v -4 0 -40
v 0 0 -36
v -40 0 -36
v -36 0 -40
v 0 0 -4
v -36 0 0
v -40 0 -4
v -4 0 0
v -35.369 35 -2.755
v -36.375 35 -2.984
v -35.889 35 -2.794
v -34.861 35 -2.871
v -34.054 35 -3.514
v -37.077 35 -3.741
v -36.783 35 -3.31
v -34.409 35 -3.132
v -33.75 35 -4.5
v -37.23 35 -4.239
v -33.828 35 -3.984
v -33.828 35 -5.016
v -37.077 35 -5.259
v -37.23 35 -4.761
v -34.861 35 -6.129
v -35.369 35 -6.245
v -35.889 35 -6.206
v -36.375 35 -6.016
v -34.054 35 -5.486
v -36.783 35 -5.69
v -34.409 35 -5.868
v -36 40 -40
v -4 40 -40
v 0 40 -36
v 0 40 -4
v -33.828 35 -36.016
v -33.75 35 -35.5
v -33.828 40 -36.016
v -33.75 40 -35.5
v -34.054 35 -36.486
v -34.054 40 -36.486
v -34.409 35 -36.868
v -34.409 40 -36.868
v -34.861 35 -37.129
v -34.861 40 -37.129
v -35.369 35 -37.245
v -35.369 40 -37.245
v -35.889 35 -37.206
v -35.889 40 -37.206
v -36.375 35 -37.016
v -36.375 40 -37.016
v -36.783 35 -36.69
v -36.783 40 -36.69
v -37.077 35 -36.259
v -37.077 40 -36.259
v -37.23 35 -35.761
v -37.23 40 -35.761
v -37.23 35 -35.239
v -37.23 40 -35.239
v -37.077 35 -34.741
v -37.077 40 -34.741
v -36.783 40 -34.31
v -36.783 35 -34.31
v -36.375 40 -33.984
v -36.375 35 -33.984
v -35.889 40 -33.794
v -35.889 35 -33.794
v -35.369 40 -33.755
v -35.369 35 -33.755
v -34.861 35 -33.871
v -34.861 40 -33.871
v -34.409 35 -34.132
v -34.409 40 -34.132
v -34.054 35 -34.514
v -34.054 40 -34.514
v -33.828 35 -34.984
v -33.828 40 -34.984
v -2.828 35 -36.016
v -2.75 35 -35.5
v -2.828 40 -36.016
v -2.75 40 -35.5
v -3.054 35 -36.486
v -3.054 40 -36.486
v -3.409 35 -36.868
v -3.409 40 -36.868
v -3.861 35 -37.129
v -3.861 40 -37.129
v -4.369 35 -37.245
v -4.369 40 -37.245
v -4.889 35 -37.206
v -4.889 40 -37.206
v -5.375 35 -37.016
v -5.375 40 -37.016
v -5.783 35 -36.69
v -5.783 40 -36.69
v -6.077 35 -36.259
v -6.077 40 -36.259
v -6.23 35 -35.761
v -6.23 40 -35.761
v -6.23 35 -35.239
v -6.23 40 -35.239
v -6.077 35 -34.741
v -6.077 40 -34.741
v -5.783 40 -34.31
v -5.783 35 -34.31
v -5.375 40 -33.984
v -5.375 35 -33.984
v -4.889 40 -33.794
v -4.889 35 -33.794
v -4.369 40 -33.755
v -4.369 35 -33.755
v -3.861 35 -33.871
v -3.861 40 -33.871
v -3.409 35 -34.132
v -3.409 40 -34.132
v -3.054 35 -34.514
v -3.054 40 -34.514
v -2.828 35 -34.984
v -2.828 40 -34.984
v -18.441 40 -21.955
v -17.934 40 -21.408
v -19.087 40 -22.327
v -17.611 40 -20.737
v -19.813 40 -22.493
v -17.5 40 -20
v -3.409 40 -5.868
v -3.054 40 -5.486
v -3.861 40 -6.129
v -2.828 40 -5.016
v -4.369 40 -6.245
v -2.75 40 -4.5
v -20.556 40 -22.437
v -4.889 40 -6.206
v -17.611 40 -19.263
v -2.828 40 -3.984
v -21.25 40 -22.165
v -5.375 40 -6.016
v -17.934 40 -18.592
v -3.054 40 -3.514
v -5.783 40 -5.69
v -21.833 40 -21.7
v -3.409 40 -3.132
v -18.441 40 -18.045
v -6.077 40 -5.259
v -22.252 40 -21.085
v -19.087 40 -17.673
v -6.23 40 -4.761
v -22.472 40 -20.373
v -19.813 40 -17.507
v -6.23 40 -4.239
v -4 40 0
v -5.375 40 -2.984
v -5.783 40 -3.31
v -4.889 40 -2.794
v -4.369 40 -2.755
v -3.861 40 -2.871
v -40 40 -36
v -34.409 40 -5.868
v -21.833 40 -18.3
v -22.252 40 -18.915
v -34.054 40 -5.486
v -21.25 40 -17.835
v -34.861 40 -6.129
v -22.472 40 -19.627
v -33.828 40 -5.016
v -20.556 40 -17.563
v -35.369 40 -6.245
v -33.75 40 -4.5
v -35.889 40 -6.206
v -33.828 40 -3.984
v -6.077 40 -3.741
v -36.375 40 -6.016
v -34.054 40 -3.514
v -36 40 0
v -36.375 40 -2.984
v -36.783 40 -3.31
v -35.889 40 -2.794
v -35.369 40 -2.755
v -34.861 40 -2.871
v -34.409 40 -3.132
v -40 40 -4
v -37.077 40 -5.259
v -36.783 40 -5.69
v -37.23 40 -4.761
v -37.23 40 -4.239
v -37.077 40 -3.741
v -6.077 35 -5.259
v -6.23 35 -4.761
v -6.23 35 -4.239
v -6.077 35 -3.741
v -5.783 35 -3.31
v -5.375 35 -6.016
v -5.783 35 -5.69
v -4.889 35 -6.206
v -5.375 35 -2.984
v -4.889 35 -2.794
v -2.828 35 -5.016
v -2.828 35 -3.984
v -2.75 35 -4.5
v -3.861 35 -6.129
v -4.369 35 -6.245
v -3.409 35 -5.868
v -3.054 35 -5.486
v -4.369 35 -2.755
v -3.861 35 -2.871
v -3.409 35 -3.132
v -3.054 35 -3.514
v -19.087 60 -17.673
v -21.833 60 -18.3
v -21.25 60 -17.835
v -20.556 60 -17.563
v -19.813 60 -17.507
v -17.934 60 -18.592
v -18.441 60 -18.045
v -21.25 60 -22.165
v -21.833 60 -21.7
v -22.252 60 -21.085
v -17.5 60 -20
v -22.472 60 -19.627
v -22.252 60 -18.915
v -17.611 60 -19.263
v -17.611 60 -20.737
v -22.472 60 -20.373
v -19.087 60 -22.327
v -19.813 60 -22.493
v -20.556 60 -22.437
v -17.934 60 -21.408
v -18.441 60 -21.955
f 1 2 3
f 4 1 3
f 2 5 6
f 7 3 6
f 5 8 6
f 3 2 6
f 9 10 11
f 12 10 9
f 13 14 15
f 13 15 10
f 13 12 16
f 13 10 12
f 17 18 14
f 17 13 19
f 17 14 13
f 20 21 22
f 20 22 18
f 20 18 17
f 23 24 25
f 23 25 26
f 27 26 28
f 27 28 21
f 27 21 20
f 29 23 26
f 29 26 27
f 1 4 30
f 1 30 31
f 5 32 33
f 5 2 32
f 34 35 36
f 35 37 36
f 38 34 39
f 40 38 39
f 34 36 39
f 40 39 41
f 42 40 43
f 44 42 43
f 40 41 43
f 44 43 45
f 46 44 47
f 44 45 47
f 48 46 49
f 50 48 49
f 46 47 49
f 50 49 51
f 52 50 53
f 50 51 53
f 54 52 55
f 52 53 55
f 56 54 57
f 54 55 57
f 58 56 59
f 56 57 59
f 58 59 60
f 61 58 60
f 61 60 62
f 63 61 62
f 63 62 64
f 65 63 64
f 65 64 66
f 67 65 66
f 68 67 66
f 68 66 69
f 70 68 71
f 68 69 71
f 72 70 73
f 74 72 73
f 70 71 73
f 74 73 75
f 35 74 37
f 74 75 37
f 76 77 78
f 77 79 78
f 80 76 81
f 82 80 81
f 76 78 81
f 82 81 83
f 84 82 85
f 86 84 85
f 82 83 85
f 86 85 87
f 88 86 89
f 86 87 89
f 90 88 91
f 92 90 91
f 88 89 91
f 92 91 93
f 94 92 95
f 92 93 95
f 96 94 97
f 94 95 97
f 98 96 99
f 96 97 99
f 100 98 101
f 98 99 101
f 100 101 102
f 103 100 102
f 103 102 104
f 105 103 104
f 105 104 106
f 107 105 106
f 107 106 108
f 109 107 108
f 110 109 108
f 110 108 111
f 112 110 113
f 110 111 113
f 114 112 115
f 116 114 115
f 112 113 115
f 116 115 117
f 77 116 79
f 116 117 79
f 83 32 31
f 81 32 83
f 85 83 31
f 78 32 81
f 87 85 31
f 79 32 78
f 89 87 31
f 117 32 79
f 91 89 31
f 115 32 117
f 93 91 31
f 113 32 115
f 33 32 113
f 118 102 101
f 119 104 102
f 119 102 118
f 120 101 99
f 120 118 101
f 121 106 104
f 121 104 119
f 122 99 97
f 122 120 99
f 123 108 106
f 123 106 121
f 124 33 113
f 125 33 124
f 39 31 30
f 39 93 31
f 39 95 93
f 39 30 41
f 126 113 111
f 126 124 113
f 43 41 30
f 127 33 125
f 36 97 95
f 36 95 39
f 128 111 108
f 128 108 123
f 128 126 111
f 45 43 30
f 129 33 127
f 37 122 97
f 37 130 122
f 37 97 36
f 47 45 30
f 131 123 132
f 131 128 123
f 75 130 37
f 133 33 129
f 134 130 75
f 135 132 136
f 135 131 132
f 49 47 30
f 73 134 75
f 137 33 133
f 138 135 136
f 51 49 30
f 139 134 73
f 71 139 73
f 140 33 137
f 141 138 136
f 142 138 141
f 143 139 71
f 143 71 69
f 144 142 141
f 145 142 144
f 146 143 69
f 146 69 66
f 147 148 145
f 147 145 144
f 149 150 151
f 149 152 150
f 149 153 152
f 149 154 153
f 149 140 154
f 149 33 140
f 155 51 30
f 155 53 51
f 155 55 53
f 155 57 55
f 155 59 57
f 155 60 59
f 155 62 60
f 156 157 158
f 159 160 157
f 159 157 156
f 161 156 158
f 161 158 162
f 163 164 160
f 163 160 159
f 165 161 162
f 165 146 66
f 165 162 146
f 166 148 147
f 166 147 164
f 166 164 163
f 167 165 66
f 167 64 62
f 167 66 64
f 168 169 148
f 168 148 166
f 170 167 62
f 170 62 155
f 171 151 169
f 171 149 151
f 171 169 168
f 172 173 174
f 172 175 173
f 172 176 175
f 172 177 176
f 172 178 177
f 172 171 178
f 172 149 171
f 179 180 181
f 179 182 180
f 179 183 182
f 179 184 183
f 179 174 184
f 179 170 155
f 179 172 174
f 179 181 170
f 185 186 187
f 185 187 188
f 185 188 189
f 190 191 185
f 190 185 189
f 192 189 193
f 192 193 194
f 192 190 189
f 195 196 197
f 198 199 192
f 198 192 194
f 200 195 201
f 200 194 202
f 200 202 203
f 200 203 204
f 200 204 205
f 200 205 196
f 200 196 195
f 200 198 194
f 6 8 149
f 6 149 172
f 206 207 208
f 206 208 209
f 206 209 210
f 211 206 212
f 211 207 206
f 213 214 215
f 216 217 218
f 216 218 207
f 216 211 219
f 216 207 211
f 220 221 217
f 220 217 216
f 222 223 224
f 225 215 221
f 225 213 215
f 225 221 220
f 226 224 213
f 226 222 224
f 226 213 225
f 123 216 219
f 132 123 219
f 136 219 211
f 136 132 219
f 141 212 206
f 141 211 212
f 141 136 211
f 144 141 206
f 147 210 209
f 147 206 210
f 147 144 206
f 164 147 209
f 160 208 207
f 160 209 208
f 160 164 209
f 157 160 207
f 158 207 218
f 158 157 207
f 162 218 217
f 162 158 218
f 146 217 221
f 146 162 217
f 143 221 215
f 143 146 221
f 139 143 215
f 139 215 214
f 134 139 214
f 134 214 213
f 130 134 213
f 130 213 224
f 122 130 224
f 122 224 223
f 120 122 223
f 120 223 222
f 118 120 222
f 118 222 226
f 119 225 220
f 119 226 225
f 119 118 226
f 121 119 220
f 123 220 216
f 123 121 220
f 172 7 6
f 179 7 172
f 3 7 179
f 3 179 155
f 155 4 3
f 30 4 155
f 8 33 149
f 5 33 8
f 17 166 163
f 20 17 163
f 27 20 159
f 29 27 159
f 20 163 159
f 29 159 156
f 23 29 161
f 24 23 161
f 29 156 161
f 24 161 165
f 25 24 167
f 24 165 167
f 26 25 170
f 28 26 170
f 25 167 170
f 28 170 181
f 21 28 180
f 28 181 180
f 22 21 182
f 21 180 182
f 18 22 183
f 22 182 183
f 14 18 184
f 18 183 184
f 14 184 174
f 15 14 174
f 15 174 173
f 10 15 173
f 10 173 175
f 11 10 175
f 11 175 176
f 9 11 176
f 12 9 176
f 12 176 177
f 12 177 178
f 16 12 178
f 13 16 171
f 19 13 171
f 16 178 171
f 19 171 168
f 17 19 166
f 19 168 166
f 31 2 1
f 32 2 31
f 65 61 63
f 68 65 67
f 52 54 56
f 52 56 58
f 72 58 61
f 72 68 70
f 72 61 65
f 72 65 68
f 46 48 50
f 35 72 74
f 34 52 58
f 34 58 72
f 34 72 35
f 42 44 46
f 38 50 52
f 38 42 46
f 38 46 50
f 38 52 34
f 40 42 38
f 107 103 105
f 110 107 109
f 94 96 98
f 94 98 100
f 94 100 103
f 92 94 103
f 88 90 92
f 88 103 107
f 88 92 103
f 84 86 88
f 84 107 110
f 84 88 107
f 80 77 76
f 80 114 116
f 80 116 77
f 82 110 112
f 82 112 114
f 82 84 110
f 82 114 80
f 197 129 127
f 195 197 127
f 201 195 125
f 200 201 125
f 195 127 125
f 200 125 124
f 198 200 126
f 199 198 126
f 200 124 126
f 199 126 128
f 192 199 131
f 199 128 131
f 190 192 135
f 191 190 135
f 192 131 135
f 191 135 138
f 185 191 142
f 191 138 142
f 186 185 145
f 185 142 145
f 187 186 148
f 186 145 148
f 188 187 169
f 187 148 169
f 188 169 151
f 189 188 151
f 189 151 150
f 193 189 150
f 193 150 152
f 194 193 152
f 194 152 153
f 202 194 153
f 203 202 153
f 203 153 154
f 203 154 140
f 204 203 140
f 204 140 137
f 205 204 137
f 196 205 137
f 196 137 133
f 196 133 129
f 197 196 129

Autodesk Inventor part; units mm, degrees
ref_plane "YZ Plane" through (0, 0, 0) normal (1, 0, 0) x (0, 1, 0)
ref_plane "XZ Plane" through (0, 0, 0) normal (0, 1, 0) x (-1, 0, 0)
ref_plane "XY Plane" through (0, 0, 0) normal (0, 0, 1) x (1, 0, 0)
sketch "Sketch1" plane through (0, 0, 0) normal (0, 1, 0) x (-1, 0, 0)
  line L0 (0, 0) -> (40, 0)
  line L1 (40, 0) -> (40, -40)
  line L2 (40, -40) -> (0, -40)
  line L3 (0, -40) -> (0, 0)
  dimension "d0" = 40
  dimension "d1" = 40
extrude "Extrusion1" add sketch "Sketch1" along normal blind 40
chamfer "Chamfer1" distance 4 angle 45 4 edges at (0, 20, 0) (0, 20, -40) (-40, 20, 0) (-40, 20, -40)
sketch "Sketch2" plane through (0, 40, 0) normal (0, 1, 0) x (1, 0, 0)
  circle A0 centre (-20, 20) radius 2.5
  line L0 (-40, 36) -> (-36, 40) projected
  line L1 (-40, 36) -> (-40, 4) projected
  line L2 (-36, 0) -> (-40, 4) projected
  line L3 (-36, 0) -> (-4, 0) projected
  line L4 (0, 4) -> (-4, 0) projected
  line L5 (0, 4) -> (0, 36) projected
  line L6 (-4, 40) -> (0, 36) projected
  line L7 (-4, 40) -> (-36, 40) projected
  point P0 (0, 0)
  dimension "d7" = 5
  dimension "d8" = 40
  dimension "d9" = 20
  dimension "d10" = 20
extrude "Extrusion2" add sketch "Sketch2" along normal blind 20 contours A0
sketch "Sketch3" plane through (0, 40, 0) normal (0, 1, 0) x (1, 0, 0)
  circle A0 centre (-20, 20) radius 2.5 projected
  line L0 (-40, 36) -> (-36, 40) projected
  line L1 (-40, 36) -> (-40, 4) projected
  line L2 (-36, 0) -> (-40, 4) projected
  line L3 (-36, 0) -> (-4, 0) projected
  line L4 (0, 4) -> (-4, 0) projected
  line L5 (0, 4) -> (0, 36) projected
  line L6 (-4, 40) -> (0, 36) projected
  line L7 (-4, 40) -> (-36, 40) projected
  circle A1 centre (-4.5, 4.5) radius 1.75
  circle A2 centre (-4.5, 35.5) radius 1.75
  circle A3 centre (-35.5, 4.5) radius 1.75
  circle A4 centre (-35.5, 35.5) radius 1.75
  point P0 (0, 0)
  dimension "d13" = 3.5
  dimension "d15" = 4
  dimension "d17" = 40
  dimension "d20" = 31
  dimension "d23" = 31
  dimension "d28" = 4.5
  dimension "d29" = 4.5
extrude "Extrusion3" cut sketch "Sketch3" against normal blind 5 contours A1 | A2 | A3 | A4
equation "\"d9\" = 0.5 * d8"
equation "\"d10\" = d9"
equation "\"d28\" = -0.5 * d23 + 0.5 * d17"
equation "\"d29\" = d28"
properties part number "mOTOR" material "Acetal Resin, Black"
